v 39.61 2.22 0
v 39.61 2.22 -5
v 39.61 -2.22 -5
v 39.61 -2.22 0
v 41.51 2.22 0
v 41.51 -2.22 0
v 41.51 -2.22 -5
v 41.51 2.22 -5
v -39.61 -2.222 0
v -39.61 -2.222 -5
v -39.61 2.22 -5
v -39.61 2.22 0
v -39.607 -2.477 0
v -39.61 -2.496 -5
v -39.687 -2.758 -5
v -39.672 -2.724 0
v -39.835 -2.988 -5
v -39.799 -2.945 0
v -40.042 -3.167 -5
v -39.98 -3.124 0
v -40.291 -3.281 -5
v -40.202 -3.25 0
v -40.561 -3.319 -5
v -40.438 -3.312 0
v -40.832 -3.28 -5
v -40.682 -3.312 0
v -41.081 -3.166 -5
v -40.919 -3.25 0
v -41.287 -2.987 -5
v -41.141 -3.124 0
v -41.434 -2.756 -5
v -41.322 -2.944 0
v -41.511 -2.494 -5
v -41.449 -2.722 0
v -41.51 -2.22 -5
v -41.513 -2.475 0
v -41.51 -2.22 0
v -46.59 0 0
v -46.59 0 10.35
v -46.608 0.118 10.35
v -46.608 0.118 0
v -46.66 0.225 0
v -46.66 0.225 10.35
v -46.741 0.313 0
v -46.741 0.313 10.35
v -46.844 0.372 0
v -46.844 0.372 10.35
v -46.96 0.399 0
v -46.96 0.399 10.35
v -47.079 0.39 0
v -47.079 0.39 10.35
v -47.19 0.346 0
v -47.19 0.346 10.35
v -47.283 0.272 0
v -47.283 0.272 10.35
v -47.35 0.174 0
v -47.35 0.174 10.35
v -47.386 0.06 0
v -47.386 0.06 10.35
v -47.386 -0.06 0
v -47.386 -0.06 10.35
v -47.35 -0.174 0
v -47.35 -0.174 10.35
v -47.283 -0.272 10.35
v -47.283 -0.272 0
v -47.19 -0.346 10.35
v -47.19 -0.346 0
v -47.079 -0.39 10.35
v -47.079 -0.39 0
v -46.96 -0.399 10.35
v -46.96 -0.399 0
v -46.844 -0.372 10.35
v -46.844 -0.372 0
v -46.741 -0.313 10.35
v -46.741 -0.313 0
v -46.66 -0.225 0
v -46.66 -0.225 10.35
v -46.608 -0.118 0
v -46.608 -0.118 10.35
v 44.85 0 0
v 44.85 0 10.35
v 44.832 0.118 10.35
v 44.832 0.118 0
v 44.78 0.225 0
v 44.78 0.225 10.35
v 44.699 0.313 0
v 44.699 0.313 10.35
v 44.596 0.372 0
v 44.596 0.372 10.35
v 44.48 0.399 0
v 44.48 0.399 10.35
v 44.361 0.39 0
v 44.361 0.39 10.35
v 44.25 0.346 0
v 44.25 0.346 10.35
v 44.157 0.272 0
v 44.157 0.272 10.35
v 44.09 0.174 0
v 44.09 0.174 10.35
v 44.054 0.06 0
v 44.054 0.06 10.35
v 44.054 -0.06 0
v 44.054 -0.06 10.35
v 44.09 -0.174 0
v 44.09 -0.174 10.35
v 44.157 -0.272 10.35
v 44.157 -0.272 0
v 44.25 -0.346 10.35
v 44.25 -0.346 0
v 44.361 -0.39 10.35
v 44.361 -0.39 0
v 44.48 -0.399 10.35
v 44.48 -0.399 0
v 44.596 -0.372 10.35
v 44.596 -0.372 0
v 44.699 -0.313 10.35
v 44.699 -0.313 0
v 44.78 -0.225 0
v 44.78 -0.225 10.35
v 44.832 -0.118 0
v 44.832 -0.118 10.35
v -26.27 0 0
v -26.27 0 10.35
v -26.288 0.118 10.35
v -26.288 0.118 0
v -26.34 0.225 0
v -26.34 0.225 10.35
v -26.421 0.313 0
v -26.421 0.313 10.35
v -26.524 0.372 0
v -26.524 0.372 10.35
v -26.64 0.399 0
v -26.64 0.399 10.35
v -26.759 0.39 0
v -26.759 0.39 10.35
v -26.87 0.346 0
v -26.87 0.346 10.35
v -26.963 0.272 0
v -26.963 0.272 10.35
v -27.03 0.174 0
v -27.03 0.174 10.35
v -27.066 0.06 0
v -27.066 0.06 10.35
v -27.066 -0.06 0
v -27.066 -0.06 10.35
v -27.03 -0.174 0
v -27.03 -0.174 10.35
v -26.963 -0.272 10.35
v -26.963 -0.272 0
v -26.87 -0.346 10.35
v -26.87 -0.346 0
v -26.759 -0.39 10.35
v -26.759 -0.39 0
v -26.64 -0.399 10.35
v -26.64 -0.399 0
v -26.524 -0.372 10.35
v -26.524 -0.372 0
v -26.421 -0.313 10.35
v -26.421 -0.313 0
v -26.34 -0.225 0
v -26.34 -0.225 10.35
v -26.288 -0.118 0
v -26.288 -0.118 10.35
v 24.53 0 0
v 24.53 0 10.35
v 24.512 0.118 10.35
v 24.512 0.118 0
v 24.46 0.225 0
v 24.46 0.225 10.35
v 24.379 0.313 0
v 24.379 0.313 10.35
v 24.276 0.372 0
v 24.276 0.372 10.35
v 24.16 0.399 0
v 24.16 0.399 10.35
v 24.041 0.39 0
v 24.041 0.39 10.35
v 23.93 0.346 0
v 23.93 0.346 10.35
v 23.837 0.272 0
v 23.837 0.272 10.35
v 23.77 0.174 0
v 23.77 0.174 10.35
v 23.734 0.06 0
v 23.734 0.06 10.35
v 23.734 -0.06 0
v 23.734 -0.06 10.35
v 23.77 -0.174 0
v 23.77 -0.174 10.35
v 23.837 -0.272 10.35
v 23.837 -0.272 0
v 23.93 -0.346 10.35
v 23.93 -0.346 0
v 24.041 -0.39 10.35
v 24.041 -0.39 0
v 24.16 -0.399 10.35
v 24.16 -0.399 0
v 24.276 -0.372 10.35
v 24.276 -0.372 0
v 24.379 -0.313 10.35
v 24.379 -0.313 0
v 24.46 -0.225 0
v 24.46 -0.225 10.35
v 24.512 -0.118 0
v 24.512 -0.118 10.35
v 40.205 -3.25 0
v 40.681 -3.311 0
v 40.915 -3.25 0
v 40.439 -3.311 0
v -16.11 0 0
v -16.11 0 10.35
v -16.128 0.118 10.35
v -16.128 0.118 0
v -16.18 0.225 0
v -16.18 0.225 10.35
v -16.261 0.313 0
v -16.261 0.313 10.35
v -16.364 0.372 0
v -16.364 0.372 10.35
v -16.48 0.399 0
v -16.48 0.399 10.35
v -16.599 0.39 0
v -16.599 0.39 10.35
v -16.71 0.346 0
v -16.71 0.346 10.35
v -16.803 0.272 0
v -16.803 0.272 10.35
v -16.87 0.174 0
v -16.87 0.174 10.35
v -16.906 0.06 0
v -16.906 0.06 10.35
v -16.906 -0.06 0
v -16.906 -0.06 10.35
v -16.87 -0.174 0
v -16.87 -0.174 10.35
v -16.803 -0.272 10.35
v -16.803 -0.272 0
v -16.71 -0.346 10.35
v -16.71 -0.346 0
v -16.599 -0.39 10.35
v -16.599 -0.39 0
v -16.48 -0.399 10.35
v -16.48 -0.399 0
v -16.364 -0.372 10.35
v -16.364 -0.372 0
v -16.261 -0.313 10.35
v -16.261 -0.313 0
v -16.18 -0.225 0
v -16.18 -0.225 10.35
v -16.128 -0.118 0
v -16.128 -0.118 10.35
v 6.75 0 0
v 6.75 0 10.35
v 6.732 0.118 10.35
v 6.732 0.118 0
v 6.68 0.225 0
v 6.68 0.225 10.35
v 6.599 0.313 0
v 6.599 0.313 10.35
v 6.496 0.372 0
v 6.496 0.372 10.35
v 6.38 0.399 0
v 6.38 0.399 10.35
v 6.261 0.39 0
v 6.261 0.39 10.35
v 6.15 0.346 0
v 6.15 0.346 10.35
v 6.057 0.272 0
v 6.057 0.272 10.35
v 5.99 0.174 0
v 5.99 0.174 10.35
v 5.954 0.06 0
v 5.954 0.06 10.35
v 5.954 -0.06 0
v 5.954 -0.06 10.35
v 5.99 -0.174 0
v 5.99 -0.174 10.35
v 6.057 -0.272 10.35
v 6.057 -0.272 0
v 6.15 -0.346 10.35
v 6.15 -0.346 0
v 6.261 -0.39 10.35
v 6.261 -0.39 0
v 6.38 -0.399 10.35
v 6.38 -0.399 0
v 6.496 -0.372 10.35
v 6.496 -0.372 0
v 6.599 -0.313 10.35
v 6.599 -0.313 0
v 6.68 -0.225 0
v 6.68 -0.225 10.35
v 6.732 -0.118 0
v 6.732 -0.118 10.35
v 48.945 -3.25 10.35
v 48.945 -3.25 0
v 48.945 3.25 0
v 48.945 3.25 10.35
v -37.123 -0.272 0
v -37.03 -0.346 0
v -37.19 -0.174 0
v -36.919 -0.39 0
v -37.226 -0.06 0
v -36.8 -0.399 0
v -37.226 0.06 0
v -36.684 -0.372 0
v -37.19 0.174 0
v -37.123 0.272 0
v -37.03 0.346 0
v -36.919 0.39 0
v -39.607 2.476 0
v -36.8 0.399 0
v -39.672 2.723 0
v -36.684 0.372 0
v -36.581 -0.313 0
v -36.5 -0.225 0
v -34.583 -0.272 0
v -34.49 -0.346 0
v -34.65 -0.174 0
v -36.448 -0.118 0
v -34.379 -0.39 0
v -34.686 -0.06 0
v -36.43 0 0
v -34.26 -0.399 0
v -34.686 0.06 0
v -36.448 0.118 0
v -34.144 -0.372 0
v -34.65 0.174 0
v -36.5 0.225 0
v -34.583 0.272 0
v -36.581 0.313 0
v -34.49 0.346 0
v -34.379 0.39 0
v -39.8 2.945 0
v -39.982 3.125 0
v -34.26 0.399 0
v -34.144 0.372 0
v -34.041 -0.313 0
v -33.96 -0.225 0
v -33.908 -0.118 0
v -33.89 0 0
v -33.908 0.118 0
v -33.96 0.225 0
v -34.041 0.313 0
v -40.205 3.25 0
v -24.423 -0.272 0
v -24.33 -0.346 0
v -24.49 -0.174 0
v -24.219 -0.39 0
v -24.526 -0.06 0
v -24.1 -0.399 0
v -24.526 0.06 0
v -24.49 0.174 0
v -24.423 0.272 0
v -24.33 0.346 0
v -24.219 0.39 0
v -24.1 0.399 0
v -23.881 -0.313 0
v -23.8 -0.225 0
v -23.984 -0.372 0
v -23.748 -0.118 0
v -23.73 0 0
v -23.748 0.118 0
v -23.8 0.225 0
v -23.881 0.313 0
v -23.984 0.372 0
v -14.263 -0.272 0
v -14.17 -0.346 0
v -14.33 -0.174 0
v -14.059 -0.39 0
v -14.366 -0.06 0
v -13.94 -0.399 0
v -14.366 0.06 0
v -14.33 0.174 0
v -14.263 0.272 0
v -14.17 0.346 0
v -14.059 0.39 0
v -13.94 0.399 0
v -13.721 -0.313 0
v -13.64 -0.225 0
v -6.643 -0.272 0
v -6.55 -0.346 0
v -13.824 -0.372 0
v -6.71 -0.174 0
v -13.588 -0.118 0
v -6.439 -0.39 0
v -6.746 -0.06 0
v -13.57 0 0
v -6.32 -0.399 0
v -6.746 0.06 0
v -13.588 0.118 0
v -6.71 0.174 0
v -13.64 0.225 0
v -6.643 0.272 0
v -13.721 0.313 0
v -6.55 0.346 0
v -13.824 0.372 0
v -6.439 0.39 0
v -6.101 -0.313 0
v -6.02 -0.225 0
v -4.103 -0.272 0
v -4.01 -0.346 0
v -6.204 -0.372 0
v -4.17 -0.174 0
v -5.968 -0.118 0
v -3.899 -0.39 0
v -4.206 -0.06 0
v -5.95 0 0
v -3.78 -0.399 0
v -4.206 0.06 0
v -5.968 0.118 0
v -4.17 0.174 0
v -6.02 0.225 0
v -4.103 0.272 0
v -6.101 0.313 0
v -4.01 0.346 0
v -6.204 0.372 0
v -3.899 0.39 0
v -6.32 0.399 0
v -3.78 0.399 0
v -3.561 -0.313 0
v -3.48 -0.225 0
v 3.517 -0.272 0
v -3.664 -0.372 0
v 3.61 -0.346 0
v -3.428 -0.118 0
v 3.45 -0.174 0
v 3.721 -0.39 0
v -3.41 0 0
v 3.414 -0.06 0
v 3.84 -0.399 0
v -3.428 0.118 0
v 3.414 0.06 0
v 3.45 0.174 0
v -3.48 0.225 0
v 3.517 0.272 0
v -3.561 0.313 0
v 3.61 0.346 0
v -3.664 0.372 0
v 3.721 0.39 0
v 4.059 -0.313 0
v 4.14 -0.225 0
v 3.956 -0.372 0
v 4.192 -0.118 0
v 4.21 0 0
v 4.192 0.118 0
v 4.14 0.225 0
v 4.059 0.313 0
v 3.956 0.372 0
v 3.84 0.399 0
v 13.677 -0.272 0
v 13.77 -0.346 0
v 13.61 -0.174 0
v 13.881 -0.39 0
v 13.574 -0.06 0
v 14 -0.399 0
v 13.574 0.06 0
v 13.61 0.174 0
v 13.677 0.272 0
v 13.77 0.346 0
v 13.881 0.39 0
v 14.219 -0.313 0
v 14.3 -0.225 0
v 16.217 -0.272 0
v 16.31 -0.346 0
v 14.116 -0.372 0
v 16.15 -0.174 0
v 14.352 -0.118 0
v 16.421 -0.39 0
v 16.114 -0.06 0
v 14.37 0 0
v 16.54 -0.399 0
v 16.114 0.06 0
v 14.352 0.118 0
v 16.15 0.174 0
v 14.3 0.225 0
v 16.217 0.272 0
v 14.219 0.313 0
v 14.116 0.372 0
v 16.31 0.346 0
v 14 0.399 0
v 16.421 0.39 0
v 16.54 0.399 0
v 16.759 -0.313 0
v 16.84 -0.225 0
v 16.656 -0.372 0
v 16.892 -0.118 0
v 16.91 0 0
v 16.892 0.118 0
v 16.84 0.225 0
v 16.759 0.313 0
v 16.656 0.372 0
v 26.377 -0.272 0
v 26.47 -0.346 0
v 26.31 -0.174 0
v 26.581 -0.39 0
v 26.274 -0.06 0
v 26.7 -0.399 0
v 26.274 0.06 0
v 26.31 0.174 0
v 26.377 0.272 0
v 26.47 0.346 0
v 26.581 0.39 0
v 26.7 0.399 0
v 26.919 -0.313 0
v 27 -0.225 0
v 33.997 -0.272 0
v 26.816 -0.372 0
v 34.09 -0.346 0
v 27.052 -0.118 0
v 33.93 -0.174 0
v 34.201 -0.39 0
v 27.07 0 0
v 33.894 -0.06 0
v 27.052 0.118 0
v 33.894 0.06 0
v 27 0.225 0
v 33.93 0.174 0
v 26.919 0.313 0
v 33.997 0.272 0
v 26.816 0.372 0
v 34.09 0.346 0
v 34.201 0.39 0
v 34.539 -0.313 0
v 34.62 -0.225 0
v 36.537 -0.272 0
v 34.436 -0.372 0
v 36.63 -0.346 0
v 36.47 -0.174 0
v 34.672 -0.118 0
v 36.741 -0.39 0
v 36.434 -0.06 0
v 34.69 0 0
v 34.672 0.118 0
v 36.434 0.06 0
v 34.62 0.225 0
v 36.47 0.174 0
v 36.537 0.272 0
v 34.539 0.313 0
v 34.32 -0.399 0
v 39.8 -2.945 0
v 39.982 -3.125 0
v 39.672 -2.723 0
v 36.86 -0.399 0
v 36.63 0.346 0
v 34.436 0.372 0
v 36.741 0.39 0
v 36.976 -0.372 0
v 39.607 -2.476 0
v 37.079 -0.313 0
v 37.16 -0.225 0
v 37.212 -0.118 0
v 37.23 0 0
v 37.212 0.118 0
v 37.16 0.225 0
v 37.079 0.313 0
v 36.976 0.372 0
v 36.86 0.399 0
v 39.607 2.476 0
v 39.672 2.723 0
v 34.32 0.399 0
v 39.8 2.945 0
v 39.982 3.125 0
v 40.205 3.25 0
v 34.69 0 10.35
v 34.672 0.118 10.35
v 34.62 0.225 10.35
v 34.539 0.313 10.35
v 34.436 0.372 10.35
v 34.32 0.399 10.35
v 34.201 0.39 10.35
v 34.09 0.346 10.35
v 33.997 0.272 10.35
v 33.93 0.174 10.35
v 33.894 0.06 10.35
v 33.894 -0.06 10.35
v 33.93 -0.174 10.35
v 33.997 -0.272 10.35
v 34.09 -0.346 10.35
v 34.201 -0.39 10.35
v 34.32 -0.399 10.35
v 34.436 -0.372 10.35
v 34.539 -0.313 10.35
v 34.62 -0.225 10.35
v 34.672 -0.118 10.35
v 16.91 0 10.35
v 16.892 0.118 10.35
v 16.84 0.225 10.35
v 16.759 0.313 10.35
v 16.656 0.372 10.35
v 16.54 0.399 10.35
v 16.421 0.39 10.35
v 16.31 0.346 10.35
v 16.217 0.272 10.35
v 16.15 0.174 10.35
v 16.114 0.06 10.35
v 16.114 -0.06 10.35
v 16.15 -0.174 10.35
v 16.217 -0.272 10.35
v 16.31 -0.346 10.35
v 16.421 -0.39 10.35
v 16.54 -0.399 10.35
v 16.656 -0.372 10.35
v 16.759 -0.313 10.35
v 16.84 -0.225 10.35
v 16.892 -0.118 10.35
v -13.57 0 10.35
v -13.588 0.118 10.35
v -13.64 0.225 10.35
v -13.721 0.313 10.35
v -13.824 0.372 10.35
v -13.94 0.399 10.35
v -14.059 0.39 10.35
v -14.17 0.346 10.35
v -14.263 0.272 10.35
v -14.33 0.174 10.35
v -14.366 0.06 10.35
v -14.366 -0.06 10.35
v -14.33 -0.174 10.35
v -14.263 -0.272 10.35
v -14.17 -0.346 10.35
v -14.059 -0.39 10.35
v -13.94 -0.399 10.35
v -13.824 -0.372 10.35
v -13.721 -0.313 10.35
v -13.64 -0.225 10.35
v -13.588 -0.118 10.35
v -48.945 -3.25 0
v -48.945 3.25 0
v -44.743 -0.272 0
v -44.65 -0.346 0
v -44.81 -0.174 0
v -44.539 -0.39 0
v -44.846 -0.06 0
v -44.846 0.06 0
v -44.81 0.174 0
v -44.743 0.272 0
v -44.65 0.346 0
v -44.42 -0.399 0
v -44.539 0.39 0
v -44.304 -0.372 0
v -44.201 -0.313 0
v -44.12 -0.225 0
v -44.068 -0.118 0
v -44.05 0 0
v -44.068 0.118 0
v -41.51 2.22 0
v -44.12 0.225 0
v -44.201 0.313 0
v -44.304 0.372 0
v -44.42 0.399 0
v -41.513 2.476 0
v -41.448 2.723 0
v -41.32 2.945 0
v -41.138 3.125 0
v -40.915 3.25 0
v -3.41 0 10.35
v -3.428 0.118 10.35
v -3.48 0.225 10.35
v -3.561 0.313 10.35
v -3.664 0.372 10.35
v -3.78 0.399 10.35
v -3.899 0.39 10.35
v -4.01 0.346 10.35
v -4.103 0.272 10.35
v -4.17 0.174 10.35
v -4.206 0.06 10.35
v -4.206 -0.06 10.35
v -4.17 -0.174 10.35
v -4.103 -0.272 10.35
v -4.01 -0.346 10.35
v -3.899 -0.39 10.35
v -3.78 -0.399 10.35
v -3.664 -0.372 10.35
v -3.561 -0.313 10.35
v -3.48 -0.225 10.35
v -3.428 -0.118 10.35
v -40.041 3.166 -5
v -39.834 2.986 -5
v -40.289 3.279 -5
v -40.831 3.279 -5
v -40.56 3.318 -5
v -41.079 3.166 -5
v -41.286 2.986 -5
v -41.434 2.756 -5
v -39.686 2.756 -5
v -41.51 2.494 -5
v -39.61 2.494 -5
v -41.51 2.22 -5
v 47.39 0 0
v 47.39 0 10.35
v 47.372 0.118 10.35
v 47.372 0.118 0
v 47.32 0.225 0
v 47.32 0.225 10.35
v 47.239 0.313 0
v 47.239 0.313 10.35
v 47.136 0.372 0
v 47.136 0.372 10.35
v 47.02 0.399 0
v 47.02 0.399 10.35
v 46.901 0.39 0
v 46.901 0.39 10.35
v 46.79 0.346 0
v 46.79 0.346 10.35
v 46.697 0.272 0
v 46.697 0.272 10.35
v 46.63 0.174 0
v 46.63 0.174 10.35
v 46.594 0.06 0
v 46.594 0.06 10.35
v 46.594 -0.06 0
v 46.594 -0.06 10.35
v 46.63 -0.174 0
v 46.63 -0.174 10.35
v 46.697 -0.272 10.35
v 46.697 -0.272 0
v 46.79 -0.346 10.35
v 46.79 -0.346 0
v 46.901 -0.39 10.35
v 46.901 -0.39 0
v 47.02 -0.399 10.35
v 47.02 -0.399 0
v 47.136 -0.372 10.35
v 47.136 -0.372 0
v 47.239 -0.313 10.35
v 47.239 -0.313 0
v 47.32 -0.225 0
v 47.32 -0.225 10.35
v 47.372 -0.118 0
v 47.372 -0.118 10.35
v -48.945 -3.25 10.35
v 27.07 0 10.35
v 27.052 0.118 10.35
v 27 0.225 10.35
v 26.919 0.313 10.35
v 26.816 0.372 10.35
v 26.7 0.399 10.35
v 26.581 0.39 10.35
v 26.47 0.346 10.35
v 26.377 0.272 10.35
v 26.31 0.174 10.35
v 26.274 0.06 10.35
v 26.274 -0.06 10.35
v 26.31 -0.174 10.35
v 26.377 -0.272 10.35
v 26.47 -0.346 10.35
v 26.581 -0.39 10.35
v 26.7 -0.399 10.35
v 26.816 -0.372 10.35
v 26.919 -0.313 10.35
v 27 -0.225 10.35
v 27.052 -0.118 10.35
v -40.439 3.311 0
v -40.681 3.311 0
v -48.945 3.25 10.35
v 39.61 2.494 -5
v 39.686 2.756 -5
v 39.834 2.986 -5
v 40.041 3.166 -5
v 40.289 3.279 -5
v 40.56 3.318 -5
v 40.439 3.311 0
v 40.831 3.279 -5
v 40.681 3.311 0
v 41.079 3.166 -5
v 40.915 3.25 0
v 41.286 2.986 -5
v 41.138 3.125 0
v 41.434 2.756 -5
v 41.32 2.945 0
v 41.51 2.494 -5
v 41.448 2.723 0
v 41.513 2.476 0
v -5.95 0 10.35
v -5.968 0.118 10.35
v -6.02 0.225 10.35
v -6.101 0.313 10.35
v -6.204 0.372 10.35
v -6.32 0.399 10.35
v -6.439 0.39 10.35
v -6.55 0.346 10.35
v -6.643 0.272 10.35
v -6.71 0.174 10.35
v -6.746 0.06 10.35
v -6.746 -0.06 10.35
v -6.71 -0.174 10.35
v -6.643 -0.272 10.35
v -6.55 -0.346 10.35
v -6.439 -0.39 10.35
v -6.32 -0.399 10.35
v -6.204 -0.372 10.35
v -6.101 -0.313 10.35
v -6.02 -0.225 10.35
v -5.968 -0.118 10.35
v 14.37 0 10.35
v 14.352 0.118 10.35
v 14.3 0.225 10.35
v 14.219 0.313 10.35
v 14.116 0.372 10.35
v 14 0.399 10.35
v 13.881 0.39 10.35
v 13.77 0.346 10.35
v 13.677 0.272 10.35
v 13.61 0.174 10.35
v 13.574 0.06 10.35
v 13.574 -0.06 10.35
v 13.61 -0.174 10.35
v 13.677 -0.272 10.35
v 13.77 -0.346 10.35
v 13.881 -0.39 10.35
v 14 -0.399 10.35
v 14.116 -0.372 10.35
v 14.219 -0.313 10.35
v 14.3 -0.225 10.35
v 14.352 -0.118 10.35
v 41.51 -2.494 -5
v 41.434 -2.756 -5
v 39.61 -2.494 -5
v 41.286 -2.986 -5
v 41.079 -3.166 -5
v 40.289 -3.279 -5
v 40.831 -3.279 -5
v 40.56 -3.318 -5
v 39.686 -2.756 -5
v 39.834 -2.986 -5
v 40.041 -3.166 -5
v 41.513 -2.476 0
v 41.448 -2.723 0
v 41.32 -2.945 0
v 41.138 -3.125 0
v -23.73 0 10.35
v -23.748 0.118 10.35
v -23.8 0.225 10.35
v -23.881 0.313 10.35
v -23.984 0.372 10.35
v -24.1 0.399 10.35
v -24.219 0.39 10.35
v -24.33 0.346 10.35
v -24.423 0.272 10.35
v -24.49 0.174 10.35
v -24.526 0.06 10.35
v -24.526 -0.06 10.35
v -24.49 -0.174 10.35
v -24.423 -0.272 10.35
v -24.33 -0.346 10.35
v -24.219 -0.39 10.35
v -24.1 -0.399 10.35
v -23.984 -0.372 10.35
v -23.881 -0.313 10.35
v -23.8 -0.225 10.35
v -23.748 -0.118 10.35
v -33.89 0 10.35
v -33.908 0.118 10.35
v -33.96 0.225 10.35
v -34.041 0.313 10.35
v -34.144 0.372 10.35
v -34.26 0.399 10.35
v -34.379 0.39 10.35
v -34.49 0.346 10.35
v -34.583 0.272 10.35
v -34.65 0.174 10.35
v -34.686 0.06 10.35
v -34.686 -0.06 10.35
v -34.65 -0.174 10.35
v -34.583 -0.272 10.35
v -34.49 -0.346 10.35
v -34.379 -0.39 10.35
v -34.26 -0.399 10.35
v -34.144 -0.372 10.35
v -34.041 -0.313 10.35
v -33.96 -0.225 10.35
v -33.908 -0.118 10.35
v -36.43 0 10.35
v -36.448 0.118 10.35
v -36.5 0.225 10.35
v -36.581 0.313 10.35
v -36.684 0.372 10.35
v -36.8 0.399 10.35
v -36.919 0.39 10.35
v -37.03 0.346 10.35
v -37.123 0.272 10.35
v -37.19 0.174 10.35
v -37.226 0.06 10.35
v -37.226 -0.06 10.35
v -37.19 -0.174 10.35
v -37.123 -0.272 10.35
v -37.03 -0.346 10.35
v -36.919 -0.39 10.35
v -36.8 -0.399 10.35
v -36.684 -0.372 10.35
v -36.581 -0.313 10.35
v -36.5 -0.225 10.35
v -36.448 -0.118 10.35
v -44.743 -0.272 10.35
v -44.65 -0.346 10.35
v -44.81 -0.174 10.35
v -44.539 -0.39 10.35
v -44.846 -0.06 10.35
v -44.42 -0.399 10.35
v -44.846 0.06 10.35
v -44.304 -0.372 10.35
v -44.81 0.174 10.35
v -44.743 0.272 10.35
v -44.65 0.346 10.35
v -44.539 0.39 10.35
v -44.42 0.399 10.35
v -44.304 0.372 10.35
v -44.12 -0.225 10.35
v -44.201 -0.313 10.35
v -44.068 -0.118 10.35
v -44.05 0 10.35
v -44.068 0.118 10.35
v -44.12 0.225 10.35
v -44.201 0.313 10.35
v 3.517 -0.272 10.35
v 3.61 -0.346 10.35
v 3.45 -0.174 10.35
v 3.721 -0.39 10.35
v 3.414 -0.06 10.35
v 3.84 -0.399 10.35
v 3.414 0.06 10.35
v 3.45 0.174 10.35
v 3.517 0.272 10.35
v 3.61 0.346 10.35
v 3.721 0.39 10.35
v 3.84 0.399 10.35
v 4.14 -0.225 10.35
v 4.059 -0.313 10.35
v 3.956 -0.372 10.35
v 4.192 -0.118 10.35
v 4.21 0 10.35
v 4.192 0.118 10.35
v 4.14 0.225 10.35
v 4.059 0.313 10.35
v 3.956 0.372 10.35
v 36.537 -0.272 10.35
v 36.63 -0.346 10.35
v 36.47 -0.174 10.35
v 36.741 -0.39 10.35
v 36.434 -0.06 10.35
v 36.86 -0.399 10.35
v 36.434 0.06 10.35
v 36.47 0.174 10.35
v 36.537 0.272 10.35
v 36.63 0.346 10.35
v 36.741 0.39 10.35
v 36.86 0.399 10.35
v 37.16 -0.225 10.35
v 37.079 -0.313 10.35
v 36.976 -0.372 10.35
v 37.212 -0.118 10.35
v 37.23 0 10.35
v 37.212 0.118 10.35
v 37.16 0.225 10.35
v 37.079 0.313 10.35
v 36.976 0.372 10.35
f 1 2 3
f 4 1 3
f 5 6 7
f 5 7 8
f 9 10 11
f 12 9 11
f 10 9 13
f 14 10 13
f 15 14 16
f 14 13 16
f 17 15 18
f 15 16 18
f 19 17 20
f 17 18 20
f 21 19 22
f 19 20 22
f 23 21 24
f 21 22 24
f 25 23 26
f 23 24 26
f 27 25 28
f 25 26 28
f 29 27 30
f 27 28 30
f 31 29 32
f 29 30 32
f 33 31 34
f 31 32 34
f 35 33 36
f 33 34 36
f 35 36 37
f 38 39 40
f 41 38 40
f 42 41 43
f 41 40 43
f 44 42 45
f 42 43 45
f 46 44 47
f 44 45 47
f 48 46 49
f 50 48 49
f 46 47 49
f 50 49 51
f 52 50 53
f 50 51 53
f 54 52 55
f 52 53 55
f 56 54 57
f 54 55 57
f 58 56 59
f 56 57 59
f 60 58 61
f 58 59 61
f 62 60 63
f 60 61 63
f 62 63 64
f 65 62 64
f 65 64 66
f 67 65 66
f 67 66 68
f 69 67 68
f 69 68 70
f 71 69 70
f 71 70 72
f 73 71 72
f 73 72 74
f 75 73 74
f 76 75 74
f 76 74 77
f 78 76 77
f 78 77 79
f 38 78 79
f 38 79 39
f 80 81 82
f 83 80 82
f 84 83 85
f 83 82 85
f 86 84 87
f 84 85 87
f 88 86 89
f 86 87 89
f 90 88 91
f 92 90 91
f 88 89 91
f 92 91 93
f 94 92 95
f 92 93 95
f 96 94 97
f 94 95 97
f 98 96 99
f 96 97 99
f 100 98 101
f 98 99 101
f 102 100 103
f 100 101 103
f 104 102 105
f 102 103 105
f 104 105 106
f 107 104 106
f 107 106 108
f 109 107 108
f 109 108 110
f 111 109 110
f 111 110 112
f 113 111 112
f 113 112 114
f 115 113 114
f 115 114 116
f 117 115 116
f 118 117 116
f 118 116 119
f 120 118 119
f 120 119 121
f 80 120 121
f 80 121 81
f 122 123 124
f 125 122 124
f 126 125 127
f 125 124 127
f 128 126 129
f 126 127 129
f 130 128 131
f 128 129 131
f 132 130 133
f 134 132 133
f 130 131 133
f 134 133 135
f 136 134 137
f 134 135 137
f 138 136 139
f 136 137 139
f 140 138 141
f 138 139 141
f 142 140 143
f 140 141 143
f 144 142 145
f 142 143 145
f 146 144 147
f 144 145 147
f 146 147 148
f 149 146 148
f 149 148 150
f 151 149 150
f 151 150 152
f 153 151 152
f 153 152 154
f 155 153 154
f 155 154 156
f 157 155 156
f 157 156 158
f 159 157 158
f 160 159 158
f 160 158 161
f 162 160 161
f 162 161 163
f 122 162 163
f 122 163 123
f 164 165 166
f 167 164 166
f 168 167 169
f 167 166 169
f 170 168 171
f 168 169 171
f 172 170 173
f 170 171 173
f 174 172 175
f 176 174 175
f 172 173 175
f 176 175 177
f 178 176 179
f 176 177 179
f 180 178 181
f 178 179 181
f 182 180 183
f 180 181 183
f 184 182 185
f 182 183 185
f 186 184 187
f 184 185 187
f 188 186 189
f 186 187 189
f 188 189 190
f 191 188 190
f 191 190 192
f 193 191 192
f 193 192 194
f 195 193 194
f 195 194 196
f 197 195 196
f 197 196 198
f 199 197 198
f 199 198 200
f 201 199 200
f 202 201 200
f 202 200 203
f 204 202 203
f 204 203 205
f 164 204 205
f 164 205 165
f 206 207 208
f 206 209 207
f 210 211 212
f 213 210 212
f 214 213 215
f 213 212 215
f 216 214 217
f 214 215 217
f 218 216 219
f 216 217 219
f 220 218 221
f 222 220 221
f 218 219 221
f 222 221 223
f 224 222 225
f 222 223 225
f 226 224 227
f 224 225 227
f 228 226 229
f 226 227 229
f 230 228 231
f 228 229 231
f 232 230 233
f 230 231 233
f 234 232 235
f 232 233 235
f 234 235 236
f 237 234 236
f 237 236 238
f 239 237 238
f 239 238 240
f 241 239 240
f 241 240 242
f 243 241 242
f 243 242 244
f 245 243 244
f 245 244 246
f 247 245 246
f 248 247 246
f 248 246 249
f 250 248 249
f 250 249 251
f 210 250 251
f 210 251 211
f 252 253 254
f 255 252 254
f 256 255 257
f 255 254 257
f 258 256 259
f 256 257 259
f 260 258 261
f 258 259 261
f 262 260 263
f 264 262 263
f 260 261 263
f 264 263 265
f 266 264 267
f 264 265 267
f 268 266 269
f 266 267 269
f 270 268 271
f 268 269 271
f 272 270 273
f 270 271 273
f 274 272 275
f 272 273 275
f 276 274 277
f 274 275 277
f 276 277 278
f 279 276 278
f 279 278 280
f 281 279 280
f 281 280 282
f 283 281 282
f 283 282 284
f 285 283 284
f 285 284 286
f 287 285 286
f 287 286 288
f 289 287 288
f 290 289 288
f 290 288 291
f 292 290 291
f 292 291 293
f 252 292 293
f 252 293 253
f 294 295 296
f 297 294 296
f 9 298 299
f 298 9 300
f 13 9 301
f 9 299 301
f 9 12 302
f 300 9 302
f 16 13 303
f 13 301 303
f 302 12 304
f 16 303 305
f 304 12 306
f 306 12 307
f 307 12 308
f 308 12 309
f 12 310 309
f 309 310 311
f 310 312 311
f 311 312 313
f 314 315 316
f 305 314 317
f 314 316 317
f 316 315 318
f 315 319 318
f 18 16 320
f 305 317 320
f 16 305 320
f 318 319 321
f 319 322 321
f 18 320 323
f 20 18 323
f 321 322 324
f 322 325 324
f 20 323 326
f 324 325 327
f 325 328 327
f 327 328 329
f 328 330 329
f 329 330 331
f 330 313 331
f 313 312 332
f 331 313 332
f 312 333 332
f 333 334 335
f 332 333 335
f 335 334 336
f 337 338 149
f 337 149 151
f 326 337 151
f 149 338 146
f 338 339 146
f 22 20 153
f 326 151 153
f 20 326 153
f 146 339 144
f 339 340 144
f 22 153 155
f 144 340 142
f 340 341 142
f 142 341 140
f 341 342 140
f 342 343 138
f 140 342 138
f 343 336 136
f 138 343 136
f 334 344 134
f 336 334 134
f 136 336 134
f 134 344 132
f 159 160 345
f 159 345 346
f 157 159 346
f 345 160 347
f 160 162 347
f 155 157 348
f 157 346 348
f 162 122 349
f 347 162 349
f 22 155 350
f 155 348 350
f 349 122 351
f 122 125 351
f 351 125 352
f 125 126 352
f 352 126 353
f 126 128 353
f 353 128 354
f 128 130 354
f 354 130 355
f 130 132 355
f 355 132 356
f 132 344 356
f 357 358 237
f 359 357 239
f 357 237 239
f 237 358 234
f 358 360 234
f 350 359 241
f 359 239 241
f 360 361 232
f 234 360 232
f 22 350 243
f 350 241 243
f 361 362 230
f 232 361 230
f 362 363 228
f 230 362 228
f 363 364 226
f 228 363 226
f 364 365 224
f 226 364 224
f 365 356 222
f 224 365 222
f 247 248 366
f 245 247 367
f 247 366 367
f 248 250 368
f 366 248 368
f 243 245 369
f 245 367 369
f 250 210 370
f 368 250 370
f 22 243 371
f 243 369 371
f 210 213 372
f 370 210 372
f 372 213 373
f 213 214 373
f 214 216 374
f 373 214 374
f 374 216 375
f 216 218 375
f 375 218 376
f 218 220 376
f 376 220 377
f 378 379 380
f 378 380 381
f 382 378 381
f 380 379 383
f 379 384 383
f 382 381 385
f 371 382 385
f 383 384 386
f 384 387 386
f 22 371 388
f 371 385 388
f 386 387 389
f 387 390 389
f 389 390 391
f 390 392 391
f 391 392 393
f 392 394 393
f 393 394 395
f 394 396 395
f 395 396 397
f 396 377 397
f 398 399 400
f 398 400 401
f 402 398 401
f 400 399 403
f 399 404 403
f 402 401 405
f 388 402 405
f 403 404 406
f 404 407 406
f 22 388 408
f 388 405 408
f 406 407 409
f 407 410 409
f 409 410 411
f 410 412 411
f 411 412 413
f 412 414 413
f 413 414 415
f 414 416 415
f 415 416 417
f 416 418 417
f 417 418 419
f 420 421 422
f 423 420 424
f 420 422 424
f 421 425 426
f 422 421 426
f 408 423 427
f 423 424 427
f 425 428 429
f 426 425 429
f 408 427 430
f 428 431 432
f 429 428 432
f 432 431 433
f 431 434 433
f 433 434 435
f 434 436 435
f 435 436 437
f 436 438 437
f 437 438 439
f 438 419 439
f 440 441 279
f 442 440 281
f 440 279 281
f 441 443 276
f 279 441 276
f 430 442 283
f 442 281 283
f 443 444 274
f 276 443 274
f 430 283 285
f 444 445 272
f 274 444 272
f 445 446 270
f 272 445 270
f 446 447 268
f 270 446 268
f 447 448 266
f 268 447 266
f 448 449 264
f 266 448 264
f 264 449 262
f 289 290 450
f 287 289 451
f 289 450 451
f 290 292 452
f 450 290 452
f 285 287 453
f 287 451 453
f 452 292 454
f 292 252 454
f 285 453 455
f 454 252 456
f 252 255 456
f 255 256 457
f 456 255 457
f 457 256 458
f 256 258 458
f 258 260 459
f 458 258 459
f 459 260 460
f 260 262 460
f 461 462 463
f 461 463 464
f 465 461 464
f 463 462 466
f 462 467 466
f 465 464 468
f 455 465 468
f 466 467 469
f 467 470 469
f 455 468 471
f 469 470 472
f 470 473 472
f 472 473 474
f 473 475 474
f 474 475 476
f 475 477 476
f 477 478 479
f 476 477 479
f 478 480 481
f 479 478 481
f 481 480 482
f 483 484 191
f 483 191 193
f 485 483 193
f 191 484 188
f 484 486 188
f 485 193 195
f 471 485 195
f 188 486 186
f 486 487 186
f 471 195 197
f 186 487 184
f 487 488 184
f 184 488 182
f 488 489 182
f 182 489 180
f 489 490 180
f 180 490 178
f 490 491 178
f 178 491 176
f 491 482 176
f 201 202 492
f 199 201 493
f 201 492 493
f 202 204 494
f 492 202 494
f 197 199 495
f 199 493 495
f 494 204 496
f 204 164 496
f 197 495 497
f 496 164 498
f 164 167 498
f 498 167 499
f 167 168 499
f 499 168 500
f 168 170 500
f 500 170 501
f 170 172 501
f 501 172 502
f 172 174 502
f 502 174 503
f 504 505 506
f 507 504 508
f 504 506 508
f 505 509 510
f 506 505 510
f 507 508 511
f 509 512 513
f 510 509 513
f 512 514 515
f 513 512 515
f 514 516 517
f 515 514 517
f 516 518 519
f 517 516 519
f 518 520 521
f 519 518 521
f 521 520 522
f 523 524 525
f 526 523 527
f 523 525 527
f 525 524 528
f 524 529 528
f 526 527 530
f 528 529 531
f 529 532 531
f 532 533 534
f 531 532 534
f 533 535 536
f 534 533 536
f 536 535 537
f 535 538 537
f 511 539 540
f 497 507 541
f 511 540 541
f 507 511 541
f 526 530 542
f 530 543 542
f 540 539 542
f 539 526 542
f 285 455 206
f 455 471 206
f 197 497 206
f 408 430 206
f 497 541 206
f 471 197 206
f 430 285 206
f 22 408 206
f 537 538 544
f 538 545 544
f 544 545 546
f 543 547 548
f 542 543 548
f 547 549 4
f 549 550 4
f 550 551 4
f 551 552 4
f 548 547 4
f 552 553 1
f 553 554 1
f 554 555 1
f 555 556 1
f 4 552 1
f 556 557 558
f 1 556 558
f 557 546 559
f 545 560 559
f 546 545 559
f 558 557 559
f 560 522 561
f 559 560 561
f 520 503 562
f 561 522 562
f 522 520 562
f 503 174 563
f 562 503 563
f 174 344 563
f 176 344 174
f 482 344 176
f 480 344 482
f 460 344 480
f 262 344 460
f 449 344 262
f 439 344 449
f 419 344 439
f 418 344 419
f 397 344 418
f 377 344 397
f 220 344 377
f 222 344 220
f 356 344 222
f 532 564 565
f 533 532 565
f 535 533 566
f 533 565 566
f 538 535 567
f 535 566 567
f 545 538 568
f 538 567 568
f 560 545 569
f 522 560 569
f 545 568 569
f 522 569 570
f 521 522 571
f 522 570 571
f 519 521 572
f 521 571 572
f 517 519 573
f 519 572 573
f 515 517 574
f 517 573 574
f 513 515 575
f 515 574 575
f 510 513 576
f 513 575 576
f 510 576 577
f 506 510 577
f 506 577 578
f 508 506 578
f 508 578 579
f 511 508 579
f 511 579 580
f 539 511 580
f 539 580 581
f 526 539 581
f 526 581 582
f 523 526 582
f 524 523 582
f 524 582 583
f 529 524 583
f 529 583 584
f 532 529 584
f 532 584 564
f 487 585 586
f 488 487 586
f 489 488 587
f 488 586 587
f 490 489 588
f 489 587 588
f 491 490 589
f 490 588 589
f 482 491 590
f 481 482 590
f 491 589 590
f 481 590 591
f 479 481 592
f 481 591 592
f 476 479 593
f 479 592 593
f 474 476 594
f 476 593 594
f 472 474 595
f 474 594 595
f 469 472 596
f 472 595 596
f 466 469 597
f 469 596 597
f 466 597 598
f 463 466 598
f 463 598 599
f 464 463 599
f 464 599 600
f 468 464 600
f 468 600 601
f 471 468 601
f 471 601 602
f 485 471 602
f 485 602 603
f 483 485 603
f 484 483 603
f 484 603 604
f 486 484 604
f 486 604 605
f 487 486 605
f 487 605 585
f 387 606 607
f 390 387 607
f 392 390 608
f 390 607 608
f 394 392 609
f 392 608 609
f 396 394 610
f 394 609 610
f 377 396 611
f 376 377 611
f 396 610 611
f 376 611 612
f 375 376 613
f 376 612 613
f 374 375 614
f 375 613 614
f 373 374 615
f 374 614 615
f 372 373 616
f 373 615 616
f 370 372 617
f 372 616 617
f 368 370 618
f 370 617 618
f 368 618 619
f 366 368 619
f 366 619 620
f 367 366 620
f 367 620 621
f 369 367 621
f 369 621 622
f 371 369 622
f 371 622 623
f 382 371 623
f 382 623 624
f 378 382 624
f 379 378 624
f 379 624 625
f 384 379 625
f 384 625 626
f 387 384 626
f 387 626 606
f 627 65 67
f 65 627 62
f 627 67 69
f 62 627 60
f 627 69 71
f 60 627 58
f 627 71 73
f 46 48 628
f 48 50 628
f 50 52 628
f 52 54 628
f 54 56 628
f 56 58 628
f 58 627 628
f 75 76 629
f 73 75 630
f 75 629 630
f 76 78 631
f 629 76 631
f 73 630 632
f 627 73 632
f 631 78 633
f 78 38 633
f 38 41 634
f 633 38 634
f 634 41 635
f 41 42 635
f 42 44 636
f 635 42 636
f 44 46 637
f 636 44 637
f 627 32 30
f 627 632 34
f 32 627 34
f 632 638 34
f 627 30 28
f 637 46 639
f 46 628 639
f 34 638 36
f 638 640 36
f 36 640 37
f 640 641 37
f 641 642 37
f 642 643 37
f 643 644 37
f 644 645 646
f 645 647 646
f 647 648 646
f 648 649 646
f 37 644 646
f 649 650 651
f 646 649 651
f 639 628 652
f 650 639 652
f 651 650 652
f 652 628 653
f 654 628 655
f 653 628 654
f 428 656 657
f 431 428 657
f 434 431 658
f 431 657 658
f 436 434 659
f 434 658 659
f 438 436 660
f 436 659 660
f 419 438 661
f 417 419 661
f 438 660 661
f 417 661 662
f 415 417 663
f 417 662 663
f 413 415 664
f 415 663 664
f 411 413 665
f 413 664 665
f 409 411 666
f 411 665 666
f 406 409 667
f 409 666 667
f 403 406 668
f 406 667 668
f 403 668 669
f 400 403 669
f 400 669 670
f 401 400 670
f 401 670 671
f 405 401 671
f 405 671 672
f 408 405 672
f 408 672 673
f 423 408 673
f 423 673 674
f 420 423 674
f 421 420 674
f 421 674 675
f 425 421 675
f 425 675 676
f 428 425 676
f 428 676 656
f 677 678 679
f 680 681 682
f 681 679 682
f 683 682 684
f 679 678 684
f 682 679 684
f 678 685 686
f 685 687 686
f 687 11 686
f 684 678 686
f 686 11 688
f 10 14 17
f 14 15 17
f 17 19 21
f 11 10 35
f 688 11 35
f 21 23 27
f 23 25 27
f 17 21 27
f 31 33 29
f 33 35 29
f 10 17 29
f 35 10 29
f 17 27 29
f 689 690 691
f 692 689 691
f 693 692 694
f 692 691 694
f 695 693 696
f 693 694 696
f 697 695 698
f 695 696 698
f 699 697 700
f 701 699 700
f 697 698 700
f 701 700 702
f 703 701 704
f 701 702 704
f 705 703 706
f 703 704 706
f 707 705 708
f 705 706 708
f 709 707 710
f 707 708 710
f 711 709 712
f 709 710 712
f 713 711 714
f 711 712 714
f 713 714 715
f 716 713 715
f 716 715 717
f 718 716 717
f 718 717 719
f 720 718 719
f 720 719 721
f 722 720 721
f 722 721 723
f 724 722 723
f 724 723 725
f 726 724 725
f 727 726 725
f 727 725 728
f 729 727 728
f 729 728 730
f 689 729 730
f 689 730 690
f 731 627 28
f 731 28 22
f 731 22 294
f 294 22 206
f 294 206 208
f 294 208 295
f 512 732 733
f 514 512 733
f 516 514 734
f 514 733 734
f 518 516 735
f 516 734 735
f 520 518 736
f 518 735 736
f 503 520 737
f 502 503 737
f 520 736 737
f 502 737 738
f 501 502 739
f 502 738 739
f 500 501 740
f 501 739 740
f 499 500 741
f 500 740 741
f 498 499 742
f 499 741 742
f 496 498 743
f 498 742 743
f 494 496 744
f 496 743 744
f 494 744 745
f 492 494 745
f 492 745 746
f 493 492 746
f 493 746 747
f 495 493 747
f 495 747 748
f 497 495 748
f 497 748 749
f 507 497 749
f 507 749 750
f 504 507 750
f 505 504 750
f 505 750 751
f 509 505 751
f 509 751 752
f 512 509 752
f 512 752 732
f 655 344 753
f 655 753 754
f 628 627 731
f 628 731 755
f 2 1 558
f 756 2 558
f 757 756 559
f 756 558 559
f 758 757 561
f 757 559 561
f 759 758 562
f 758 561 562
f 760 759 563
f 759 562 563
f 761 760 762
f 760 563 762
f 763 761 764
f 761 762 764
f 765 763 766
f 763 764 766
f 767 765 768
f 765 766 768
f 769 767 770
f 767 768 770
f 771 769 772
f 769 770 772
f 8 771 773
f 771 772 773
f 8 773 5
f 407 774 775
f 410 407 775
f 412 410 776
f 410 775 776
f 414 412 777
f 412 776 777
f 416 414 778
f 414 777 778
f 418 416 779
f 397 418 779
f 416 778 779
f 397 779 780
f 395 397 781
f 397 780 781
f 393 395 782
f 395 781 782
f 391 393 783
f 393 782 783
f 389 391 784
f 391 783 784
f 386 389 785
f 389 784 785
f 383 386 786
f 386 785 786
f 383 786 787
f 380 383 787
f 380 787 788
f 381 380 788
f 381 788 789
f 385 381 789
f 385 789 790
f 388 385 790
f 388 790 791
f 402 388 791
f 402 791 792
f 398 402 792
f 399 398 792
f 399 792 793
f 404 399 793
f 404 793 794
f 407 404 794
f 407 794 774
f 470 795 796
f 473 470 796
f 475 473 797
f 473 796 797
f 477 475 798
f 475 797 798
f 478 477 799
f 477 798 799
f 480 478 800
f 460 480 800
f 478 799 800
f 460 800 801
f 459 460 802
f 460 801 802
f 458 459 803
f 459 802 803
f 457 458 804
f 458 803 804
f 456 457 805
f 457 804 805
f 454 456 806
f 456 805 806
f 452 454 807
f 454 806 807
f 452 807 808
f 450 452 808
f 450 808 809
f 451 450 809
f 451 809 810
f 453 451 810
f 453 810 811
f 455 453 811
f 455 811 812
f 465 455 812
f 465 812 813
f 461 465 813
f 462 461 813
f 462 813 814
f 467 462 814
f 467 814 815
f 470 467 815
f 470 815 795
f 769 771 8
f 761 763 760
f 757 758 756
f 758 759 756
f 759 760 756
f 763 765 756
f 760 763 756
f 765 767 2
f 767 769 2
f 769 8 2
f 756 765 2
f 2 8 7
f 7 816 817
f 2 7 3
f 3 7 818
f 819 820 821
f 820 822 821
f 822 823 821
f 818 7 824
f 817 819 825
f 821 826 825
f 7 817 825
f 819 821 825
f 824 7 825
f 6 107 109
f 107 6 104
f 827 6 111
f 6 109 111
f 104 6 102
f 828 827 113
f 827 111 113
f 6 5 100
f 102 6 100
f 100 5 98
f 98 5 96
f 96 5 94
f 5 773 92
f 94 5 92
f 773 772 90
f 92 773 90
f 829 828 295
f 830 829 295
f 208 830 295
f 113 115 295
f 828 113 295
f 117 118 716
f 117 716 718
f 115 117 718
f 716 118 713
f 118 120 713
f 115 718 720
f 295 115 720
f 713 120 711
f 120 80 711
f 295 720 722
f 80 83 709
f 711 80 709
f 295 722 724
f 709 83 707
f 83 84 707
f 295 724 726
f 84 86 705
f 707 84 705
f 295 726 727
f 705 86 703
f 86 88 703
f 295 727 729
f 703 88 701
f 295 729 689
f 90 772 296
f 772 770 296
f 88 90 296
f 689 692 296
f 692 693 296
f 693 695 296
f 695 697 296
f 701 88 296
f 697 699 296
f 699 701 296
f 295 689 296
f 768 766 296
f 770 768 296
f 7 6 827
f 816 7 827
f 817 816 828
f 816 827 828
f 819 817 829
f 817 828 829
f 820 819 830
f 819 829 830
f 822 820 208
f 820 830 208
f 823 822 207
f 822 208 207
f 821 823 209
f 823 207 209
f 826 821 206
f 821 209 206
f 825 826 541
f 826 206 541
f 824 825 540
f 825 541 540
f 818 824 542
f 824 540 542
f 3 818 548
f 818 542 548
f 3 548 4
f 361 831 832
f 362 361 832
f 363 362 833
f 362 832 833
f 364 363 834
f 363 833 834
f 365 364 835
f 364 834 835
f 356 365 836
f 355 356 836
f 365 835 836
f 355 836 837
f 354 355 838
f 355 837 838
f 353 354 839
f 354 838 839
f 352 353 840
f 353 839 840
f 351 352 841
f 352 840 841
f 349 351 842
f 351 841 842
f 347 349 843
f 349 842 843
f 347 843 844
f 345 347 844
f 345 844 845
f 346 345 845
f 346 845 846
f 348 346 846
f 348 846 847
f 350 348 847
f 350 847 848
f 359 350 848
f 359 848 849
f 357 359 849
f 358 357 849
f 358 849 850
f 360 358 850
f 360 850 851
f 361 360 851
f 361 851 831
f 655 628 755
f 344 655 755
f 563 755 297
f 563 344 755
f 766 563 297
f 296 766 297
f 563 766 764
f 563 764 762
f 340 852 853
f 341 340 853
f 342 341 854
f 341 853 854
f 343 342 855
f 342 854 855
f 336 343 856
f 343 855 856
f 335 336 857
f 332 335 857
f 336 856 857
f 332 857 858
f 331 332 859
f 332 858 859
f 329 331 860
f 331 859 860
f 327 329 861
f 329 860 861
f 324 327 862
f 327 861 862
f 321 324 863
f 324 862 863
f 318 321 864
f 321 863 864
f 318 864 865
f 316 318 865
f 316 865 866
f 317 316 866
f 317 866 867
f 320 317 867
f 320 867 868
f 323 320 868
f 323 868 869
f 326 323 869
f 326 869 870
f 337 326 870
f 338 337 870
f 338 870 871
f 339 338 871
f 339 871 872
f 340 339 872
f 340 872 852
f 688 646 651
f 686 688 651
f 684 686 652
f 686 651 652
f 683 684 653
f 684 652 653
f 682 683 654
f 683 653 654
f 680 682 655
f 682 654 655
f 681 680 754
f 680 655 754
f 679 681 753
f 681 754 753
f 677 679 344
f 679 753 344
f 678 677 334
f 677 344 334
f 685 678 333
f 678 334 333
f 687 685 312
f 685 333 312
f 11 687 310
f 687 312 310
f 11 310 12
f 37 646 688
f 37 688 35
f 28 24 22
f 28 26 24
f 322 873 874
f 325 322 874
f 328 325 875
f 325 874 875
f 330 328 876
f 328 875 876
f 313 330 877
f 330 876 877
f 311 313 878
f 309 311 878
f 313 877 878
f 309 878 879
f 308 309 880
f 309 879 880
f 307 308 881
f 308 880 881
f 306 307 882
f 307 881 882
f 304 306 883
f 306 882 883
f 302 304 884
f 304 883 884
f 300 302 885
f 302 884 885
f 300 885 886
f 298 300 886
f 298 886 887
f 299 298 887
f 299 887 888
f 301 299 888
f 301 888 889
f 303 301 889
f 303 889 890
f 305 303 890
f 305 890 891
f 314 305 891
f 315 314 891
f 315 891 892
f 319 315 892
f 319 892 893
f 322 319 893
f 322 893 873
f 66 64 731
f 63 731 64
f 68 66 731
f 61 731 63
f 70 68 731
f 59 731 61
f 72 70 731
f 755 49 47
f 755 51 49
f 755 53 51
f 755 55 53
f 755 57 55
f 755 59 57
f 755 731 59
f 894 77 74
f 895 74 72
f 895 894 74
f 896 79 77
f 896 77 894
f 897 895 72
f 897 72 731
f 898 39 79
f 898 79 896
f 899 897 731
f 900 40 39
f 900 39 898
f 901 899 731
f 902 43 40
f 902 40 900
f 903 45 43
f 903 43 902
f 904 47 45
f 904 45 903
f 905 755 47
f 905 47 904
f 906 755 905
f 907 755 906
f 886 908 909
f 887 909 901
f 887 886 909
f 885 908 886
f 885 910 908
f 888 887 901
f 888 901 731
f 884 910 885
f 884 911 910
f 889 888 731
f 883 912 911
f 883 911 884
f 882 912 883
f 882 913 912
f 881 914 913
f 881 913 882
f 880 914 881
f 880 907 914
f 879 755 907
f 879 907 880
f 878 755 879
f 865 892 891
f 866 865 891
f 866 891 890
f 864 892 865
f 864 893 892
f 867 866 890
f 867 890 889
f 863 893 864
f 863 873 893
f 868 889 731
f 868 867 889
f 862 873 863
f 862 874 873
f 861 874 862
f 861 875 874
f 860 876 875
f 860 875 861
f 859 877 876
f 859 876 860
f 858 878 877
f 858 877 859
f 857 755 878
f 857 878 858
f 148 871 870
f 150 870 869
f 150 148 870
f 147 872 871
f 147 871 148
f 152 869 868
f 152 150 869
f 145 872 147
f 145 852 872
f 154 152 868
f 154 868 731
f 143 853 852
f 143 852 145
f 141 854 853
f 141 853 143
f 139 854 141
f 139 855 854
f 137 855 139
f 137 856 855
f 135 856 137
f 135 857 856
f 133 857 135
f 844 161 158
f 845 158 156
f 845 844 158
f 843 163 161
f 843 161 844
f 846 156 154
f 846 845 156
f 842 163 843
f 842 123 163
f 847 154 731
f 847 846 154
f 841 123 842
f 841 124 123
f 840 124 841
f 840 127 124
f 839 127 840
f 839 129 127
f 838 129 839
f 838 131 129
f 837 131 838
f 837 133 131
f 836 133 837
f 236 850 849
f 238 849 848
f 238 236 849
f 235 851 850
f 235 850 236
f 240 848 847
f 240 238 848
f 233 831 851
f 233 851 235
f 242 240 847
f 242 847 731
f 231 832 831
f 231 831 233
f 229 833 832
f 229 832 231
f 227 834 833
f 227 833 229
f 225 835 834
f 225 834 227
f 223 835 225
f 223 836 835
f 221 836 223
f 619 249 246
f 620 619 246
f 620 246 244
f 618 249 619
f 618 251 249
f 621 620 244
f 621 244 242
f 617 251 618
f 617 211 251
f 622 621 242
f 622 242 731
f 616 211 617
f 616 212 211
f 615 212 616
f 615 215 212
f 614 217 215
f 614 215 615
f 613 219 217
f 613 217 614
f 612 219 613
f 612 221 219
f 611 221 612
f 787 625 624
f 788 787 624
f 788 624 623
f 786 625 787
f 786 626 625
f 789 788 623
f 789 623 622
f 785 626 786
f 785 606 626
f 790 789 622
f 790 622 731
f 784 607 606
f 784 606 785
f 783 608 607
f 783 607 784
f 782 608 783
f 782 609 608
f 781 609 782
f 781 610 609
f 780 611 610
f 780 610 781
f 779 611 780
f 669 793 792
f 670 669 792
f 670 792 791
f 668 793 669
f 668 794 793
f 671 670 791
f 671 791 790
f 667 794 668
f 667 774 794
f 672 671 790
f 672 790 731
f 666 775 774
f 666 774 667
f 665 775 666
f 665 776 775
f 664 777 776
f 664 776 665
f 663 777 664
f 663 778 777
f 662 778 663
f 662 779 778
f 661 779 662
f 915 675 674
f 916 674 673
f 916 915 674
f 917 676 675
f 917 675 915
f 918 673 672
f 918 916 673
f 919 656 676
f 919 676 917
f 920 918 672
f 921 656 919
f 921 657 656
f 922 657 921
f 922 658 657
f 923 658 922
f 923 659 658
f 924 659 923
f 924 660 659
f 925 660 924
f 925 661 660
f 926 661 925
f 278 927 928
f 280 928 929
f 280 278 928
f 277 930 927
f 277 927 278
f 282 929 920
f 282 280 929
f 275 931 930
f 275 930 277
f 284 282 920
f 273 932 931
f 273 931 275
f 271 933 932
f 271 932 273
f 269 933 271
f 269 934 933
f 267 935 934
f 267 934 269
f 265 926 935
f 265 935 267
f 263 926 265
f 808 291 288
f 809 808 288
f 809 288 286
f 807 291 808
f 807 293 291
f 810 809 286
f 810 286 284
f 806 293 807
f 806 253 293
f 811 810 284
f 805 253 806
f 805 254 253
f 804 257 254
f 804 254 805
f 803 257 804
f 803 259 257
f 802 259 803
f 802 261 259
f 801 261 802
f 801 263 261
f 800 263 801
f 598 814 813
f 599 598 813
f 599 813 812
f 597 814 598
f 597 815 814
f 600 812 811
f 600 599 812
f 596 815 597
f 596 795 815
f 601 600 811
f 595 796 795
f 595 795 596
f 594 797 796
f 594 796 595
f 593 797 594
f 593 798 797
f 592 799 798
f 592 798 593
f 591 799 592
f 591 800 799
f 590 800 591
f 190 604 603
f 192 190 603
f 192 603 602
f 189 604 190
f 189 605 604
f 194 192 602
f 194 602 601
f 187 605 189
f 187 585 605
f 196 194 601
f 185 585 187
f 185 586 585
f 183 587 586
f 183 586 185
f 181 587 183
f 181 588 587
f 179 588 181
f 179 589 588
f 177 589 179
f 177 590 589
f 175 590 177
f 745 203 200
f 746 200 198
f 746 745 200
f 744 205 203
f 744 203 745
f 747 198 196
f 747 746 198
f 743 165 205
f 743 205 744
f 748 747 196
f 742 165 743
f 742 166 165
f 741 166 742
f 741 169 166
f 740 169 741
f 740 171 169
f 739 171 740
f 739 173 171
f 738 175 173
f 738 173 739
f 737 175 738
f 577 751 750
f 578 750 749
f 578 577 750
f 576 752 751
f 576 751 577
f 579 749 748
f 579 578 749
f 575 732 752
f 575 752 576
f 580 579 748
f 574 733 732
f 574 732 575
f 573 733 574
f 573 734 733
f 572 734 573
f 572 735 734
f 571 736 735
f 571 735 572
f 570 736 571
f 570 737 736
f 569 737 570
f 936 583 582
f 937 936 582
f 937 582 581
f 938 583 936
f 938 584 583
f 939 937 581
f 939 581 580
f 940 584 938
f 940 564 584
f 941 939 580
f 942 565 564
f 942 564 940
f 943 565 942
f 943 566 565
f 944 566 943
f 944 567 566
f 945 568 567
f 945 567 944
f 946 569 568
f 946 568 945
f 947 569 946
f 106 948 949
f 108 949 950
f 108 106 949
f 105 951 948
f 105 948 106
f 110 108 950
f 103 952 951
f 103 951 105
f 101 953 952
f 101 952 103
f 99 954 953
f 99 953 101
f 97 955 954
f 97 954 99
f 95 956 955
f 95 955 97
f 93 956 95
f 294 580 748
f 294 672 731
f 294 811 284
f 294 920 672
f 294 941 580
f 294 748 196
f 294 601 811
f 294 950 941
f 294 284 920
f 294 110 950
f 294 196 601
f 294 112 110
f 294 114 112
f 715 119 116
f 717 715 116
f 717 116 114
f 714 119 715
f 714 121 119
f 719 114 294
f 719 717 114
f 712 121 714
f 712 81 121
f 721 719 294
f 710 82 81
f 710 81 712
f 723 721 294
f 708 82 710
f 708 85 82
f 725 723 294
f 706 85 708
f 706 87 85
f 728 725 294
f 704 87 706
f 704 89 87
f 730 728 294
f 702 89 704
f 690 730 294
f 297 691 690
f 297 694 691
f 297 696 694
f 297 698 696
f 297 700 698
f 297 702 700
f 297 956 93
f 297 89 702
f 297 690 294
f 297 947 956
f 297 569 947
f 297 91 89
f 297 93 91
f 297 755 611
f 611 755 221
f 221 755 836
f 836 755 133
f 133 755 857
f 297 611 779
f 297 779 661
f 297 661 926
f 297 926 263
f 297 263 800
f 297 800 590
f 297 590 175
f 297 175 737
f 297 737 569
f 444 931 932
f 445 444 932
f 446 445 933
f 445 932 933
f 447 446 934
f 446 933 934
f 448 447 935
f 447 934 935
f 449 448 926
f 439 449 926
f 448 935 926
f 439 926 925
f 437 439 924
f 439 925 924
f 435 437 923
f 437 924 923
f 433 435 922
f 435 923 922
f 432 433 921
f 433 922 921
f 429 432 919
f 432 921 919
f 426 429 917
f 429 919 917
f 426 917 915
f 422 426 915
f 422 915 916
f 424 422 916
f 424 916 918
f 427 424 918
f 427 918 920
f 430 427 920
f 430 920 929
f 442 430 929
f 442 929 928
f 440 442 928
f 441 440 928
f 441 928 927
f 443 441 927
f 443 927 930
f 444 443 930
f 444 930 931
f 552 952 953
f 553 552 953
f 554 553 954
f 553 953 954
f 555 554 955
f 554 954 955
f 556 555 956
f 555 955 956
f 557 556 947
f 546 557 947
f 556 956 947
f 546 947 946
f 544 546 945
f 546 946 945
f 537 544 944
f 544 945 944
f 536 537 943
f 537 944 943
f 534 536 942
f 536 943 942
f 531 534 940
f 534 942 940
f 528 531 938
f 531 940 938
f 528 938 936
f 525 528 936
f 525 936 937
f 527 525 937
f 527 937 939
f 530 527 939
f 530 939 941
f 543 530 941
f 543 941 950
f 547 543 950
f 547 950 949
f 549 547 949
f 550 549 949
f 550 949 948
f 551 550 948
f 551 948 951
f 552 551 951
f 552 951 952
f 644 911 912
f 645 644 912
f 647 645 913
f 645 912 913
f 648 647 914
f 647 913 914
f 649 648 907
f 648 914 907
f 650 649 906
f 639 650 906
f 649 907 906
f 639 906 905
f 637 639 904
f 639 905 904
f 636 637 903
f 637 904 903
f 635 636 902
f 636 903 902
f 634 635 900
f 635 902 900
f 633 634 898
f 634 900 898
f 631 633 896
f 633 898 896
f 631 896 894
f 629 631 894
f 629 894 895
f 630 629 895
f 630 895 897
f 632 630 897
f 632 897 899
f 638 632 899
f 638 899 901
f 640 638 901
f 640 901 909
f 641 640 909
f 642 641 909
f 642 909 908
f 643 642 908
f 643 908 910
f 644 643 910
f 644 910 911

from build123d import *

# Parameters (mm, degrees)
SKETCH_W     = 97.89
SKETCH_H     = 6.5
PAD_DEPTH    = 10.35
SKETCH001_R  = 0.4
POCKET_DEPTH = 70
PAD001_DEPTH = 5


with BuildPart() as part:
    # Sketch → Pad (new body)
    with BuildSketch(Plane.XY):
        Rectangle(SKETCH_W, SKETCH_H)
    extrude(amount=PAD_DEPTH)

    # Sketch001 (on Face6 of Pad) → Pocket (cut)
    with BuildSketch(Plane.XY.offset(10.35)):
        with Locations((3.81, 0)):
            Circle(SKETCH001_R)
        with Locations((6.35, 0)):
            Circle(SKETCH001_R)
        with Locations((-16.51, 0)):
            Circle(SKETCH001_R)
        with Locations((-13.97, 0)):
            Circle(SKETCH001_R)
        with Locations((-34.29, 0)):
            Circle(SKETCH001_R)
        with Locations((-36.83, 0)):
            Circle(SKETCH001_R)
        with Locations((13.97, 0)):
            Circle(SKETCH001_R)
        with Locations((16.51, 0)):
            Circle(SKETCH001_R)
        with Locations((24.13, 0)):
            Circle(SKETCH001_R)
        with Locations((26.67, 0)):
            Circle(SKETCH001_R)
        with Locations((34.29, 0)):
            Circle(SKETCH001_R)
        with Locations((36.83, 0)):
            Circle(SKETCH001_R)
        with Locations((44.45, 0)):
            Circle(SKETCH001_R)
        with Locations((46.99, 0)):
            Circle(SKETCH001_R)
        with Locations((-46.99, 0)):
            Circle(SKETCH001_R)
        with Locations((-44.45, 0)):
            Circle(SKETCH001_R)
        with Locations((-26.67, 0)):
            Circle(SKETCH001_R)
        with Locations((-24.13, 0)):
            Circle(SKETCH001_R)
        with Locations((-6.35, 0)):
            Circle(SKETCH001_R)
        with Locations((-3.81, 0)):
            Circle(SKETCH001_R)
    extrude(amount=-POCKET_DEPTH, mode=Mode.SUBTRACT)

    # Sketch002 (on Face4 of Pocket) → Pad001 (join)
    with BuildSketch(Plane(origin=(0, 0, 0), x_dir=(1, 0, 0), z_dir=(0, 0, -1))):
        with BuildLine():
            Line((-39.61, 2.2225), (-39.61, -2.22))
            ThreePointArc((-41.51, -2.22), (-40.56, -3.318203), (-39.61, -2.22))
            Line((-41.51, -2.22), (-41.51, 2.22))
            ThreePointArc((-39.61, 2.2225), (-40.561445, 3.319446), (-41.51, 2.22))
        make_face()
        with BuildLine():
            Line((41.51, 2.22), (41.51, -2.22))
            ThreePointArc((39.61, -2.22), (40.56, -3.318203), (41.51, -2.22))
            Line((39.61, -2.22), (39.61, 2.22))
            ThreePointArc((41.51, 2.22), (40.56, 3.318203), (39.61, 2.22))
        make_face()
    extrude(amount=PAD001_DEPTH)


solid = part.part
